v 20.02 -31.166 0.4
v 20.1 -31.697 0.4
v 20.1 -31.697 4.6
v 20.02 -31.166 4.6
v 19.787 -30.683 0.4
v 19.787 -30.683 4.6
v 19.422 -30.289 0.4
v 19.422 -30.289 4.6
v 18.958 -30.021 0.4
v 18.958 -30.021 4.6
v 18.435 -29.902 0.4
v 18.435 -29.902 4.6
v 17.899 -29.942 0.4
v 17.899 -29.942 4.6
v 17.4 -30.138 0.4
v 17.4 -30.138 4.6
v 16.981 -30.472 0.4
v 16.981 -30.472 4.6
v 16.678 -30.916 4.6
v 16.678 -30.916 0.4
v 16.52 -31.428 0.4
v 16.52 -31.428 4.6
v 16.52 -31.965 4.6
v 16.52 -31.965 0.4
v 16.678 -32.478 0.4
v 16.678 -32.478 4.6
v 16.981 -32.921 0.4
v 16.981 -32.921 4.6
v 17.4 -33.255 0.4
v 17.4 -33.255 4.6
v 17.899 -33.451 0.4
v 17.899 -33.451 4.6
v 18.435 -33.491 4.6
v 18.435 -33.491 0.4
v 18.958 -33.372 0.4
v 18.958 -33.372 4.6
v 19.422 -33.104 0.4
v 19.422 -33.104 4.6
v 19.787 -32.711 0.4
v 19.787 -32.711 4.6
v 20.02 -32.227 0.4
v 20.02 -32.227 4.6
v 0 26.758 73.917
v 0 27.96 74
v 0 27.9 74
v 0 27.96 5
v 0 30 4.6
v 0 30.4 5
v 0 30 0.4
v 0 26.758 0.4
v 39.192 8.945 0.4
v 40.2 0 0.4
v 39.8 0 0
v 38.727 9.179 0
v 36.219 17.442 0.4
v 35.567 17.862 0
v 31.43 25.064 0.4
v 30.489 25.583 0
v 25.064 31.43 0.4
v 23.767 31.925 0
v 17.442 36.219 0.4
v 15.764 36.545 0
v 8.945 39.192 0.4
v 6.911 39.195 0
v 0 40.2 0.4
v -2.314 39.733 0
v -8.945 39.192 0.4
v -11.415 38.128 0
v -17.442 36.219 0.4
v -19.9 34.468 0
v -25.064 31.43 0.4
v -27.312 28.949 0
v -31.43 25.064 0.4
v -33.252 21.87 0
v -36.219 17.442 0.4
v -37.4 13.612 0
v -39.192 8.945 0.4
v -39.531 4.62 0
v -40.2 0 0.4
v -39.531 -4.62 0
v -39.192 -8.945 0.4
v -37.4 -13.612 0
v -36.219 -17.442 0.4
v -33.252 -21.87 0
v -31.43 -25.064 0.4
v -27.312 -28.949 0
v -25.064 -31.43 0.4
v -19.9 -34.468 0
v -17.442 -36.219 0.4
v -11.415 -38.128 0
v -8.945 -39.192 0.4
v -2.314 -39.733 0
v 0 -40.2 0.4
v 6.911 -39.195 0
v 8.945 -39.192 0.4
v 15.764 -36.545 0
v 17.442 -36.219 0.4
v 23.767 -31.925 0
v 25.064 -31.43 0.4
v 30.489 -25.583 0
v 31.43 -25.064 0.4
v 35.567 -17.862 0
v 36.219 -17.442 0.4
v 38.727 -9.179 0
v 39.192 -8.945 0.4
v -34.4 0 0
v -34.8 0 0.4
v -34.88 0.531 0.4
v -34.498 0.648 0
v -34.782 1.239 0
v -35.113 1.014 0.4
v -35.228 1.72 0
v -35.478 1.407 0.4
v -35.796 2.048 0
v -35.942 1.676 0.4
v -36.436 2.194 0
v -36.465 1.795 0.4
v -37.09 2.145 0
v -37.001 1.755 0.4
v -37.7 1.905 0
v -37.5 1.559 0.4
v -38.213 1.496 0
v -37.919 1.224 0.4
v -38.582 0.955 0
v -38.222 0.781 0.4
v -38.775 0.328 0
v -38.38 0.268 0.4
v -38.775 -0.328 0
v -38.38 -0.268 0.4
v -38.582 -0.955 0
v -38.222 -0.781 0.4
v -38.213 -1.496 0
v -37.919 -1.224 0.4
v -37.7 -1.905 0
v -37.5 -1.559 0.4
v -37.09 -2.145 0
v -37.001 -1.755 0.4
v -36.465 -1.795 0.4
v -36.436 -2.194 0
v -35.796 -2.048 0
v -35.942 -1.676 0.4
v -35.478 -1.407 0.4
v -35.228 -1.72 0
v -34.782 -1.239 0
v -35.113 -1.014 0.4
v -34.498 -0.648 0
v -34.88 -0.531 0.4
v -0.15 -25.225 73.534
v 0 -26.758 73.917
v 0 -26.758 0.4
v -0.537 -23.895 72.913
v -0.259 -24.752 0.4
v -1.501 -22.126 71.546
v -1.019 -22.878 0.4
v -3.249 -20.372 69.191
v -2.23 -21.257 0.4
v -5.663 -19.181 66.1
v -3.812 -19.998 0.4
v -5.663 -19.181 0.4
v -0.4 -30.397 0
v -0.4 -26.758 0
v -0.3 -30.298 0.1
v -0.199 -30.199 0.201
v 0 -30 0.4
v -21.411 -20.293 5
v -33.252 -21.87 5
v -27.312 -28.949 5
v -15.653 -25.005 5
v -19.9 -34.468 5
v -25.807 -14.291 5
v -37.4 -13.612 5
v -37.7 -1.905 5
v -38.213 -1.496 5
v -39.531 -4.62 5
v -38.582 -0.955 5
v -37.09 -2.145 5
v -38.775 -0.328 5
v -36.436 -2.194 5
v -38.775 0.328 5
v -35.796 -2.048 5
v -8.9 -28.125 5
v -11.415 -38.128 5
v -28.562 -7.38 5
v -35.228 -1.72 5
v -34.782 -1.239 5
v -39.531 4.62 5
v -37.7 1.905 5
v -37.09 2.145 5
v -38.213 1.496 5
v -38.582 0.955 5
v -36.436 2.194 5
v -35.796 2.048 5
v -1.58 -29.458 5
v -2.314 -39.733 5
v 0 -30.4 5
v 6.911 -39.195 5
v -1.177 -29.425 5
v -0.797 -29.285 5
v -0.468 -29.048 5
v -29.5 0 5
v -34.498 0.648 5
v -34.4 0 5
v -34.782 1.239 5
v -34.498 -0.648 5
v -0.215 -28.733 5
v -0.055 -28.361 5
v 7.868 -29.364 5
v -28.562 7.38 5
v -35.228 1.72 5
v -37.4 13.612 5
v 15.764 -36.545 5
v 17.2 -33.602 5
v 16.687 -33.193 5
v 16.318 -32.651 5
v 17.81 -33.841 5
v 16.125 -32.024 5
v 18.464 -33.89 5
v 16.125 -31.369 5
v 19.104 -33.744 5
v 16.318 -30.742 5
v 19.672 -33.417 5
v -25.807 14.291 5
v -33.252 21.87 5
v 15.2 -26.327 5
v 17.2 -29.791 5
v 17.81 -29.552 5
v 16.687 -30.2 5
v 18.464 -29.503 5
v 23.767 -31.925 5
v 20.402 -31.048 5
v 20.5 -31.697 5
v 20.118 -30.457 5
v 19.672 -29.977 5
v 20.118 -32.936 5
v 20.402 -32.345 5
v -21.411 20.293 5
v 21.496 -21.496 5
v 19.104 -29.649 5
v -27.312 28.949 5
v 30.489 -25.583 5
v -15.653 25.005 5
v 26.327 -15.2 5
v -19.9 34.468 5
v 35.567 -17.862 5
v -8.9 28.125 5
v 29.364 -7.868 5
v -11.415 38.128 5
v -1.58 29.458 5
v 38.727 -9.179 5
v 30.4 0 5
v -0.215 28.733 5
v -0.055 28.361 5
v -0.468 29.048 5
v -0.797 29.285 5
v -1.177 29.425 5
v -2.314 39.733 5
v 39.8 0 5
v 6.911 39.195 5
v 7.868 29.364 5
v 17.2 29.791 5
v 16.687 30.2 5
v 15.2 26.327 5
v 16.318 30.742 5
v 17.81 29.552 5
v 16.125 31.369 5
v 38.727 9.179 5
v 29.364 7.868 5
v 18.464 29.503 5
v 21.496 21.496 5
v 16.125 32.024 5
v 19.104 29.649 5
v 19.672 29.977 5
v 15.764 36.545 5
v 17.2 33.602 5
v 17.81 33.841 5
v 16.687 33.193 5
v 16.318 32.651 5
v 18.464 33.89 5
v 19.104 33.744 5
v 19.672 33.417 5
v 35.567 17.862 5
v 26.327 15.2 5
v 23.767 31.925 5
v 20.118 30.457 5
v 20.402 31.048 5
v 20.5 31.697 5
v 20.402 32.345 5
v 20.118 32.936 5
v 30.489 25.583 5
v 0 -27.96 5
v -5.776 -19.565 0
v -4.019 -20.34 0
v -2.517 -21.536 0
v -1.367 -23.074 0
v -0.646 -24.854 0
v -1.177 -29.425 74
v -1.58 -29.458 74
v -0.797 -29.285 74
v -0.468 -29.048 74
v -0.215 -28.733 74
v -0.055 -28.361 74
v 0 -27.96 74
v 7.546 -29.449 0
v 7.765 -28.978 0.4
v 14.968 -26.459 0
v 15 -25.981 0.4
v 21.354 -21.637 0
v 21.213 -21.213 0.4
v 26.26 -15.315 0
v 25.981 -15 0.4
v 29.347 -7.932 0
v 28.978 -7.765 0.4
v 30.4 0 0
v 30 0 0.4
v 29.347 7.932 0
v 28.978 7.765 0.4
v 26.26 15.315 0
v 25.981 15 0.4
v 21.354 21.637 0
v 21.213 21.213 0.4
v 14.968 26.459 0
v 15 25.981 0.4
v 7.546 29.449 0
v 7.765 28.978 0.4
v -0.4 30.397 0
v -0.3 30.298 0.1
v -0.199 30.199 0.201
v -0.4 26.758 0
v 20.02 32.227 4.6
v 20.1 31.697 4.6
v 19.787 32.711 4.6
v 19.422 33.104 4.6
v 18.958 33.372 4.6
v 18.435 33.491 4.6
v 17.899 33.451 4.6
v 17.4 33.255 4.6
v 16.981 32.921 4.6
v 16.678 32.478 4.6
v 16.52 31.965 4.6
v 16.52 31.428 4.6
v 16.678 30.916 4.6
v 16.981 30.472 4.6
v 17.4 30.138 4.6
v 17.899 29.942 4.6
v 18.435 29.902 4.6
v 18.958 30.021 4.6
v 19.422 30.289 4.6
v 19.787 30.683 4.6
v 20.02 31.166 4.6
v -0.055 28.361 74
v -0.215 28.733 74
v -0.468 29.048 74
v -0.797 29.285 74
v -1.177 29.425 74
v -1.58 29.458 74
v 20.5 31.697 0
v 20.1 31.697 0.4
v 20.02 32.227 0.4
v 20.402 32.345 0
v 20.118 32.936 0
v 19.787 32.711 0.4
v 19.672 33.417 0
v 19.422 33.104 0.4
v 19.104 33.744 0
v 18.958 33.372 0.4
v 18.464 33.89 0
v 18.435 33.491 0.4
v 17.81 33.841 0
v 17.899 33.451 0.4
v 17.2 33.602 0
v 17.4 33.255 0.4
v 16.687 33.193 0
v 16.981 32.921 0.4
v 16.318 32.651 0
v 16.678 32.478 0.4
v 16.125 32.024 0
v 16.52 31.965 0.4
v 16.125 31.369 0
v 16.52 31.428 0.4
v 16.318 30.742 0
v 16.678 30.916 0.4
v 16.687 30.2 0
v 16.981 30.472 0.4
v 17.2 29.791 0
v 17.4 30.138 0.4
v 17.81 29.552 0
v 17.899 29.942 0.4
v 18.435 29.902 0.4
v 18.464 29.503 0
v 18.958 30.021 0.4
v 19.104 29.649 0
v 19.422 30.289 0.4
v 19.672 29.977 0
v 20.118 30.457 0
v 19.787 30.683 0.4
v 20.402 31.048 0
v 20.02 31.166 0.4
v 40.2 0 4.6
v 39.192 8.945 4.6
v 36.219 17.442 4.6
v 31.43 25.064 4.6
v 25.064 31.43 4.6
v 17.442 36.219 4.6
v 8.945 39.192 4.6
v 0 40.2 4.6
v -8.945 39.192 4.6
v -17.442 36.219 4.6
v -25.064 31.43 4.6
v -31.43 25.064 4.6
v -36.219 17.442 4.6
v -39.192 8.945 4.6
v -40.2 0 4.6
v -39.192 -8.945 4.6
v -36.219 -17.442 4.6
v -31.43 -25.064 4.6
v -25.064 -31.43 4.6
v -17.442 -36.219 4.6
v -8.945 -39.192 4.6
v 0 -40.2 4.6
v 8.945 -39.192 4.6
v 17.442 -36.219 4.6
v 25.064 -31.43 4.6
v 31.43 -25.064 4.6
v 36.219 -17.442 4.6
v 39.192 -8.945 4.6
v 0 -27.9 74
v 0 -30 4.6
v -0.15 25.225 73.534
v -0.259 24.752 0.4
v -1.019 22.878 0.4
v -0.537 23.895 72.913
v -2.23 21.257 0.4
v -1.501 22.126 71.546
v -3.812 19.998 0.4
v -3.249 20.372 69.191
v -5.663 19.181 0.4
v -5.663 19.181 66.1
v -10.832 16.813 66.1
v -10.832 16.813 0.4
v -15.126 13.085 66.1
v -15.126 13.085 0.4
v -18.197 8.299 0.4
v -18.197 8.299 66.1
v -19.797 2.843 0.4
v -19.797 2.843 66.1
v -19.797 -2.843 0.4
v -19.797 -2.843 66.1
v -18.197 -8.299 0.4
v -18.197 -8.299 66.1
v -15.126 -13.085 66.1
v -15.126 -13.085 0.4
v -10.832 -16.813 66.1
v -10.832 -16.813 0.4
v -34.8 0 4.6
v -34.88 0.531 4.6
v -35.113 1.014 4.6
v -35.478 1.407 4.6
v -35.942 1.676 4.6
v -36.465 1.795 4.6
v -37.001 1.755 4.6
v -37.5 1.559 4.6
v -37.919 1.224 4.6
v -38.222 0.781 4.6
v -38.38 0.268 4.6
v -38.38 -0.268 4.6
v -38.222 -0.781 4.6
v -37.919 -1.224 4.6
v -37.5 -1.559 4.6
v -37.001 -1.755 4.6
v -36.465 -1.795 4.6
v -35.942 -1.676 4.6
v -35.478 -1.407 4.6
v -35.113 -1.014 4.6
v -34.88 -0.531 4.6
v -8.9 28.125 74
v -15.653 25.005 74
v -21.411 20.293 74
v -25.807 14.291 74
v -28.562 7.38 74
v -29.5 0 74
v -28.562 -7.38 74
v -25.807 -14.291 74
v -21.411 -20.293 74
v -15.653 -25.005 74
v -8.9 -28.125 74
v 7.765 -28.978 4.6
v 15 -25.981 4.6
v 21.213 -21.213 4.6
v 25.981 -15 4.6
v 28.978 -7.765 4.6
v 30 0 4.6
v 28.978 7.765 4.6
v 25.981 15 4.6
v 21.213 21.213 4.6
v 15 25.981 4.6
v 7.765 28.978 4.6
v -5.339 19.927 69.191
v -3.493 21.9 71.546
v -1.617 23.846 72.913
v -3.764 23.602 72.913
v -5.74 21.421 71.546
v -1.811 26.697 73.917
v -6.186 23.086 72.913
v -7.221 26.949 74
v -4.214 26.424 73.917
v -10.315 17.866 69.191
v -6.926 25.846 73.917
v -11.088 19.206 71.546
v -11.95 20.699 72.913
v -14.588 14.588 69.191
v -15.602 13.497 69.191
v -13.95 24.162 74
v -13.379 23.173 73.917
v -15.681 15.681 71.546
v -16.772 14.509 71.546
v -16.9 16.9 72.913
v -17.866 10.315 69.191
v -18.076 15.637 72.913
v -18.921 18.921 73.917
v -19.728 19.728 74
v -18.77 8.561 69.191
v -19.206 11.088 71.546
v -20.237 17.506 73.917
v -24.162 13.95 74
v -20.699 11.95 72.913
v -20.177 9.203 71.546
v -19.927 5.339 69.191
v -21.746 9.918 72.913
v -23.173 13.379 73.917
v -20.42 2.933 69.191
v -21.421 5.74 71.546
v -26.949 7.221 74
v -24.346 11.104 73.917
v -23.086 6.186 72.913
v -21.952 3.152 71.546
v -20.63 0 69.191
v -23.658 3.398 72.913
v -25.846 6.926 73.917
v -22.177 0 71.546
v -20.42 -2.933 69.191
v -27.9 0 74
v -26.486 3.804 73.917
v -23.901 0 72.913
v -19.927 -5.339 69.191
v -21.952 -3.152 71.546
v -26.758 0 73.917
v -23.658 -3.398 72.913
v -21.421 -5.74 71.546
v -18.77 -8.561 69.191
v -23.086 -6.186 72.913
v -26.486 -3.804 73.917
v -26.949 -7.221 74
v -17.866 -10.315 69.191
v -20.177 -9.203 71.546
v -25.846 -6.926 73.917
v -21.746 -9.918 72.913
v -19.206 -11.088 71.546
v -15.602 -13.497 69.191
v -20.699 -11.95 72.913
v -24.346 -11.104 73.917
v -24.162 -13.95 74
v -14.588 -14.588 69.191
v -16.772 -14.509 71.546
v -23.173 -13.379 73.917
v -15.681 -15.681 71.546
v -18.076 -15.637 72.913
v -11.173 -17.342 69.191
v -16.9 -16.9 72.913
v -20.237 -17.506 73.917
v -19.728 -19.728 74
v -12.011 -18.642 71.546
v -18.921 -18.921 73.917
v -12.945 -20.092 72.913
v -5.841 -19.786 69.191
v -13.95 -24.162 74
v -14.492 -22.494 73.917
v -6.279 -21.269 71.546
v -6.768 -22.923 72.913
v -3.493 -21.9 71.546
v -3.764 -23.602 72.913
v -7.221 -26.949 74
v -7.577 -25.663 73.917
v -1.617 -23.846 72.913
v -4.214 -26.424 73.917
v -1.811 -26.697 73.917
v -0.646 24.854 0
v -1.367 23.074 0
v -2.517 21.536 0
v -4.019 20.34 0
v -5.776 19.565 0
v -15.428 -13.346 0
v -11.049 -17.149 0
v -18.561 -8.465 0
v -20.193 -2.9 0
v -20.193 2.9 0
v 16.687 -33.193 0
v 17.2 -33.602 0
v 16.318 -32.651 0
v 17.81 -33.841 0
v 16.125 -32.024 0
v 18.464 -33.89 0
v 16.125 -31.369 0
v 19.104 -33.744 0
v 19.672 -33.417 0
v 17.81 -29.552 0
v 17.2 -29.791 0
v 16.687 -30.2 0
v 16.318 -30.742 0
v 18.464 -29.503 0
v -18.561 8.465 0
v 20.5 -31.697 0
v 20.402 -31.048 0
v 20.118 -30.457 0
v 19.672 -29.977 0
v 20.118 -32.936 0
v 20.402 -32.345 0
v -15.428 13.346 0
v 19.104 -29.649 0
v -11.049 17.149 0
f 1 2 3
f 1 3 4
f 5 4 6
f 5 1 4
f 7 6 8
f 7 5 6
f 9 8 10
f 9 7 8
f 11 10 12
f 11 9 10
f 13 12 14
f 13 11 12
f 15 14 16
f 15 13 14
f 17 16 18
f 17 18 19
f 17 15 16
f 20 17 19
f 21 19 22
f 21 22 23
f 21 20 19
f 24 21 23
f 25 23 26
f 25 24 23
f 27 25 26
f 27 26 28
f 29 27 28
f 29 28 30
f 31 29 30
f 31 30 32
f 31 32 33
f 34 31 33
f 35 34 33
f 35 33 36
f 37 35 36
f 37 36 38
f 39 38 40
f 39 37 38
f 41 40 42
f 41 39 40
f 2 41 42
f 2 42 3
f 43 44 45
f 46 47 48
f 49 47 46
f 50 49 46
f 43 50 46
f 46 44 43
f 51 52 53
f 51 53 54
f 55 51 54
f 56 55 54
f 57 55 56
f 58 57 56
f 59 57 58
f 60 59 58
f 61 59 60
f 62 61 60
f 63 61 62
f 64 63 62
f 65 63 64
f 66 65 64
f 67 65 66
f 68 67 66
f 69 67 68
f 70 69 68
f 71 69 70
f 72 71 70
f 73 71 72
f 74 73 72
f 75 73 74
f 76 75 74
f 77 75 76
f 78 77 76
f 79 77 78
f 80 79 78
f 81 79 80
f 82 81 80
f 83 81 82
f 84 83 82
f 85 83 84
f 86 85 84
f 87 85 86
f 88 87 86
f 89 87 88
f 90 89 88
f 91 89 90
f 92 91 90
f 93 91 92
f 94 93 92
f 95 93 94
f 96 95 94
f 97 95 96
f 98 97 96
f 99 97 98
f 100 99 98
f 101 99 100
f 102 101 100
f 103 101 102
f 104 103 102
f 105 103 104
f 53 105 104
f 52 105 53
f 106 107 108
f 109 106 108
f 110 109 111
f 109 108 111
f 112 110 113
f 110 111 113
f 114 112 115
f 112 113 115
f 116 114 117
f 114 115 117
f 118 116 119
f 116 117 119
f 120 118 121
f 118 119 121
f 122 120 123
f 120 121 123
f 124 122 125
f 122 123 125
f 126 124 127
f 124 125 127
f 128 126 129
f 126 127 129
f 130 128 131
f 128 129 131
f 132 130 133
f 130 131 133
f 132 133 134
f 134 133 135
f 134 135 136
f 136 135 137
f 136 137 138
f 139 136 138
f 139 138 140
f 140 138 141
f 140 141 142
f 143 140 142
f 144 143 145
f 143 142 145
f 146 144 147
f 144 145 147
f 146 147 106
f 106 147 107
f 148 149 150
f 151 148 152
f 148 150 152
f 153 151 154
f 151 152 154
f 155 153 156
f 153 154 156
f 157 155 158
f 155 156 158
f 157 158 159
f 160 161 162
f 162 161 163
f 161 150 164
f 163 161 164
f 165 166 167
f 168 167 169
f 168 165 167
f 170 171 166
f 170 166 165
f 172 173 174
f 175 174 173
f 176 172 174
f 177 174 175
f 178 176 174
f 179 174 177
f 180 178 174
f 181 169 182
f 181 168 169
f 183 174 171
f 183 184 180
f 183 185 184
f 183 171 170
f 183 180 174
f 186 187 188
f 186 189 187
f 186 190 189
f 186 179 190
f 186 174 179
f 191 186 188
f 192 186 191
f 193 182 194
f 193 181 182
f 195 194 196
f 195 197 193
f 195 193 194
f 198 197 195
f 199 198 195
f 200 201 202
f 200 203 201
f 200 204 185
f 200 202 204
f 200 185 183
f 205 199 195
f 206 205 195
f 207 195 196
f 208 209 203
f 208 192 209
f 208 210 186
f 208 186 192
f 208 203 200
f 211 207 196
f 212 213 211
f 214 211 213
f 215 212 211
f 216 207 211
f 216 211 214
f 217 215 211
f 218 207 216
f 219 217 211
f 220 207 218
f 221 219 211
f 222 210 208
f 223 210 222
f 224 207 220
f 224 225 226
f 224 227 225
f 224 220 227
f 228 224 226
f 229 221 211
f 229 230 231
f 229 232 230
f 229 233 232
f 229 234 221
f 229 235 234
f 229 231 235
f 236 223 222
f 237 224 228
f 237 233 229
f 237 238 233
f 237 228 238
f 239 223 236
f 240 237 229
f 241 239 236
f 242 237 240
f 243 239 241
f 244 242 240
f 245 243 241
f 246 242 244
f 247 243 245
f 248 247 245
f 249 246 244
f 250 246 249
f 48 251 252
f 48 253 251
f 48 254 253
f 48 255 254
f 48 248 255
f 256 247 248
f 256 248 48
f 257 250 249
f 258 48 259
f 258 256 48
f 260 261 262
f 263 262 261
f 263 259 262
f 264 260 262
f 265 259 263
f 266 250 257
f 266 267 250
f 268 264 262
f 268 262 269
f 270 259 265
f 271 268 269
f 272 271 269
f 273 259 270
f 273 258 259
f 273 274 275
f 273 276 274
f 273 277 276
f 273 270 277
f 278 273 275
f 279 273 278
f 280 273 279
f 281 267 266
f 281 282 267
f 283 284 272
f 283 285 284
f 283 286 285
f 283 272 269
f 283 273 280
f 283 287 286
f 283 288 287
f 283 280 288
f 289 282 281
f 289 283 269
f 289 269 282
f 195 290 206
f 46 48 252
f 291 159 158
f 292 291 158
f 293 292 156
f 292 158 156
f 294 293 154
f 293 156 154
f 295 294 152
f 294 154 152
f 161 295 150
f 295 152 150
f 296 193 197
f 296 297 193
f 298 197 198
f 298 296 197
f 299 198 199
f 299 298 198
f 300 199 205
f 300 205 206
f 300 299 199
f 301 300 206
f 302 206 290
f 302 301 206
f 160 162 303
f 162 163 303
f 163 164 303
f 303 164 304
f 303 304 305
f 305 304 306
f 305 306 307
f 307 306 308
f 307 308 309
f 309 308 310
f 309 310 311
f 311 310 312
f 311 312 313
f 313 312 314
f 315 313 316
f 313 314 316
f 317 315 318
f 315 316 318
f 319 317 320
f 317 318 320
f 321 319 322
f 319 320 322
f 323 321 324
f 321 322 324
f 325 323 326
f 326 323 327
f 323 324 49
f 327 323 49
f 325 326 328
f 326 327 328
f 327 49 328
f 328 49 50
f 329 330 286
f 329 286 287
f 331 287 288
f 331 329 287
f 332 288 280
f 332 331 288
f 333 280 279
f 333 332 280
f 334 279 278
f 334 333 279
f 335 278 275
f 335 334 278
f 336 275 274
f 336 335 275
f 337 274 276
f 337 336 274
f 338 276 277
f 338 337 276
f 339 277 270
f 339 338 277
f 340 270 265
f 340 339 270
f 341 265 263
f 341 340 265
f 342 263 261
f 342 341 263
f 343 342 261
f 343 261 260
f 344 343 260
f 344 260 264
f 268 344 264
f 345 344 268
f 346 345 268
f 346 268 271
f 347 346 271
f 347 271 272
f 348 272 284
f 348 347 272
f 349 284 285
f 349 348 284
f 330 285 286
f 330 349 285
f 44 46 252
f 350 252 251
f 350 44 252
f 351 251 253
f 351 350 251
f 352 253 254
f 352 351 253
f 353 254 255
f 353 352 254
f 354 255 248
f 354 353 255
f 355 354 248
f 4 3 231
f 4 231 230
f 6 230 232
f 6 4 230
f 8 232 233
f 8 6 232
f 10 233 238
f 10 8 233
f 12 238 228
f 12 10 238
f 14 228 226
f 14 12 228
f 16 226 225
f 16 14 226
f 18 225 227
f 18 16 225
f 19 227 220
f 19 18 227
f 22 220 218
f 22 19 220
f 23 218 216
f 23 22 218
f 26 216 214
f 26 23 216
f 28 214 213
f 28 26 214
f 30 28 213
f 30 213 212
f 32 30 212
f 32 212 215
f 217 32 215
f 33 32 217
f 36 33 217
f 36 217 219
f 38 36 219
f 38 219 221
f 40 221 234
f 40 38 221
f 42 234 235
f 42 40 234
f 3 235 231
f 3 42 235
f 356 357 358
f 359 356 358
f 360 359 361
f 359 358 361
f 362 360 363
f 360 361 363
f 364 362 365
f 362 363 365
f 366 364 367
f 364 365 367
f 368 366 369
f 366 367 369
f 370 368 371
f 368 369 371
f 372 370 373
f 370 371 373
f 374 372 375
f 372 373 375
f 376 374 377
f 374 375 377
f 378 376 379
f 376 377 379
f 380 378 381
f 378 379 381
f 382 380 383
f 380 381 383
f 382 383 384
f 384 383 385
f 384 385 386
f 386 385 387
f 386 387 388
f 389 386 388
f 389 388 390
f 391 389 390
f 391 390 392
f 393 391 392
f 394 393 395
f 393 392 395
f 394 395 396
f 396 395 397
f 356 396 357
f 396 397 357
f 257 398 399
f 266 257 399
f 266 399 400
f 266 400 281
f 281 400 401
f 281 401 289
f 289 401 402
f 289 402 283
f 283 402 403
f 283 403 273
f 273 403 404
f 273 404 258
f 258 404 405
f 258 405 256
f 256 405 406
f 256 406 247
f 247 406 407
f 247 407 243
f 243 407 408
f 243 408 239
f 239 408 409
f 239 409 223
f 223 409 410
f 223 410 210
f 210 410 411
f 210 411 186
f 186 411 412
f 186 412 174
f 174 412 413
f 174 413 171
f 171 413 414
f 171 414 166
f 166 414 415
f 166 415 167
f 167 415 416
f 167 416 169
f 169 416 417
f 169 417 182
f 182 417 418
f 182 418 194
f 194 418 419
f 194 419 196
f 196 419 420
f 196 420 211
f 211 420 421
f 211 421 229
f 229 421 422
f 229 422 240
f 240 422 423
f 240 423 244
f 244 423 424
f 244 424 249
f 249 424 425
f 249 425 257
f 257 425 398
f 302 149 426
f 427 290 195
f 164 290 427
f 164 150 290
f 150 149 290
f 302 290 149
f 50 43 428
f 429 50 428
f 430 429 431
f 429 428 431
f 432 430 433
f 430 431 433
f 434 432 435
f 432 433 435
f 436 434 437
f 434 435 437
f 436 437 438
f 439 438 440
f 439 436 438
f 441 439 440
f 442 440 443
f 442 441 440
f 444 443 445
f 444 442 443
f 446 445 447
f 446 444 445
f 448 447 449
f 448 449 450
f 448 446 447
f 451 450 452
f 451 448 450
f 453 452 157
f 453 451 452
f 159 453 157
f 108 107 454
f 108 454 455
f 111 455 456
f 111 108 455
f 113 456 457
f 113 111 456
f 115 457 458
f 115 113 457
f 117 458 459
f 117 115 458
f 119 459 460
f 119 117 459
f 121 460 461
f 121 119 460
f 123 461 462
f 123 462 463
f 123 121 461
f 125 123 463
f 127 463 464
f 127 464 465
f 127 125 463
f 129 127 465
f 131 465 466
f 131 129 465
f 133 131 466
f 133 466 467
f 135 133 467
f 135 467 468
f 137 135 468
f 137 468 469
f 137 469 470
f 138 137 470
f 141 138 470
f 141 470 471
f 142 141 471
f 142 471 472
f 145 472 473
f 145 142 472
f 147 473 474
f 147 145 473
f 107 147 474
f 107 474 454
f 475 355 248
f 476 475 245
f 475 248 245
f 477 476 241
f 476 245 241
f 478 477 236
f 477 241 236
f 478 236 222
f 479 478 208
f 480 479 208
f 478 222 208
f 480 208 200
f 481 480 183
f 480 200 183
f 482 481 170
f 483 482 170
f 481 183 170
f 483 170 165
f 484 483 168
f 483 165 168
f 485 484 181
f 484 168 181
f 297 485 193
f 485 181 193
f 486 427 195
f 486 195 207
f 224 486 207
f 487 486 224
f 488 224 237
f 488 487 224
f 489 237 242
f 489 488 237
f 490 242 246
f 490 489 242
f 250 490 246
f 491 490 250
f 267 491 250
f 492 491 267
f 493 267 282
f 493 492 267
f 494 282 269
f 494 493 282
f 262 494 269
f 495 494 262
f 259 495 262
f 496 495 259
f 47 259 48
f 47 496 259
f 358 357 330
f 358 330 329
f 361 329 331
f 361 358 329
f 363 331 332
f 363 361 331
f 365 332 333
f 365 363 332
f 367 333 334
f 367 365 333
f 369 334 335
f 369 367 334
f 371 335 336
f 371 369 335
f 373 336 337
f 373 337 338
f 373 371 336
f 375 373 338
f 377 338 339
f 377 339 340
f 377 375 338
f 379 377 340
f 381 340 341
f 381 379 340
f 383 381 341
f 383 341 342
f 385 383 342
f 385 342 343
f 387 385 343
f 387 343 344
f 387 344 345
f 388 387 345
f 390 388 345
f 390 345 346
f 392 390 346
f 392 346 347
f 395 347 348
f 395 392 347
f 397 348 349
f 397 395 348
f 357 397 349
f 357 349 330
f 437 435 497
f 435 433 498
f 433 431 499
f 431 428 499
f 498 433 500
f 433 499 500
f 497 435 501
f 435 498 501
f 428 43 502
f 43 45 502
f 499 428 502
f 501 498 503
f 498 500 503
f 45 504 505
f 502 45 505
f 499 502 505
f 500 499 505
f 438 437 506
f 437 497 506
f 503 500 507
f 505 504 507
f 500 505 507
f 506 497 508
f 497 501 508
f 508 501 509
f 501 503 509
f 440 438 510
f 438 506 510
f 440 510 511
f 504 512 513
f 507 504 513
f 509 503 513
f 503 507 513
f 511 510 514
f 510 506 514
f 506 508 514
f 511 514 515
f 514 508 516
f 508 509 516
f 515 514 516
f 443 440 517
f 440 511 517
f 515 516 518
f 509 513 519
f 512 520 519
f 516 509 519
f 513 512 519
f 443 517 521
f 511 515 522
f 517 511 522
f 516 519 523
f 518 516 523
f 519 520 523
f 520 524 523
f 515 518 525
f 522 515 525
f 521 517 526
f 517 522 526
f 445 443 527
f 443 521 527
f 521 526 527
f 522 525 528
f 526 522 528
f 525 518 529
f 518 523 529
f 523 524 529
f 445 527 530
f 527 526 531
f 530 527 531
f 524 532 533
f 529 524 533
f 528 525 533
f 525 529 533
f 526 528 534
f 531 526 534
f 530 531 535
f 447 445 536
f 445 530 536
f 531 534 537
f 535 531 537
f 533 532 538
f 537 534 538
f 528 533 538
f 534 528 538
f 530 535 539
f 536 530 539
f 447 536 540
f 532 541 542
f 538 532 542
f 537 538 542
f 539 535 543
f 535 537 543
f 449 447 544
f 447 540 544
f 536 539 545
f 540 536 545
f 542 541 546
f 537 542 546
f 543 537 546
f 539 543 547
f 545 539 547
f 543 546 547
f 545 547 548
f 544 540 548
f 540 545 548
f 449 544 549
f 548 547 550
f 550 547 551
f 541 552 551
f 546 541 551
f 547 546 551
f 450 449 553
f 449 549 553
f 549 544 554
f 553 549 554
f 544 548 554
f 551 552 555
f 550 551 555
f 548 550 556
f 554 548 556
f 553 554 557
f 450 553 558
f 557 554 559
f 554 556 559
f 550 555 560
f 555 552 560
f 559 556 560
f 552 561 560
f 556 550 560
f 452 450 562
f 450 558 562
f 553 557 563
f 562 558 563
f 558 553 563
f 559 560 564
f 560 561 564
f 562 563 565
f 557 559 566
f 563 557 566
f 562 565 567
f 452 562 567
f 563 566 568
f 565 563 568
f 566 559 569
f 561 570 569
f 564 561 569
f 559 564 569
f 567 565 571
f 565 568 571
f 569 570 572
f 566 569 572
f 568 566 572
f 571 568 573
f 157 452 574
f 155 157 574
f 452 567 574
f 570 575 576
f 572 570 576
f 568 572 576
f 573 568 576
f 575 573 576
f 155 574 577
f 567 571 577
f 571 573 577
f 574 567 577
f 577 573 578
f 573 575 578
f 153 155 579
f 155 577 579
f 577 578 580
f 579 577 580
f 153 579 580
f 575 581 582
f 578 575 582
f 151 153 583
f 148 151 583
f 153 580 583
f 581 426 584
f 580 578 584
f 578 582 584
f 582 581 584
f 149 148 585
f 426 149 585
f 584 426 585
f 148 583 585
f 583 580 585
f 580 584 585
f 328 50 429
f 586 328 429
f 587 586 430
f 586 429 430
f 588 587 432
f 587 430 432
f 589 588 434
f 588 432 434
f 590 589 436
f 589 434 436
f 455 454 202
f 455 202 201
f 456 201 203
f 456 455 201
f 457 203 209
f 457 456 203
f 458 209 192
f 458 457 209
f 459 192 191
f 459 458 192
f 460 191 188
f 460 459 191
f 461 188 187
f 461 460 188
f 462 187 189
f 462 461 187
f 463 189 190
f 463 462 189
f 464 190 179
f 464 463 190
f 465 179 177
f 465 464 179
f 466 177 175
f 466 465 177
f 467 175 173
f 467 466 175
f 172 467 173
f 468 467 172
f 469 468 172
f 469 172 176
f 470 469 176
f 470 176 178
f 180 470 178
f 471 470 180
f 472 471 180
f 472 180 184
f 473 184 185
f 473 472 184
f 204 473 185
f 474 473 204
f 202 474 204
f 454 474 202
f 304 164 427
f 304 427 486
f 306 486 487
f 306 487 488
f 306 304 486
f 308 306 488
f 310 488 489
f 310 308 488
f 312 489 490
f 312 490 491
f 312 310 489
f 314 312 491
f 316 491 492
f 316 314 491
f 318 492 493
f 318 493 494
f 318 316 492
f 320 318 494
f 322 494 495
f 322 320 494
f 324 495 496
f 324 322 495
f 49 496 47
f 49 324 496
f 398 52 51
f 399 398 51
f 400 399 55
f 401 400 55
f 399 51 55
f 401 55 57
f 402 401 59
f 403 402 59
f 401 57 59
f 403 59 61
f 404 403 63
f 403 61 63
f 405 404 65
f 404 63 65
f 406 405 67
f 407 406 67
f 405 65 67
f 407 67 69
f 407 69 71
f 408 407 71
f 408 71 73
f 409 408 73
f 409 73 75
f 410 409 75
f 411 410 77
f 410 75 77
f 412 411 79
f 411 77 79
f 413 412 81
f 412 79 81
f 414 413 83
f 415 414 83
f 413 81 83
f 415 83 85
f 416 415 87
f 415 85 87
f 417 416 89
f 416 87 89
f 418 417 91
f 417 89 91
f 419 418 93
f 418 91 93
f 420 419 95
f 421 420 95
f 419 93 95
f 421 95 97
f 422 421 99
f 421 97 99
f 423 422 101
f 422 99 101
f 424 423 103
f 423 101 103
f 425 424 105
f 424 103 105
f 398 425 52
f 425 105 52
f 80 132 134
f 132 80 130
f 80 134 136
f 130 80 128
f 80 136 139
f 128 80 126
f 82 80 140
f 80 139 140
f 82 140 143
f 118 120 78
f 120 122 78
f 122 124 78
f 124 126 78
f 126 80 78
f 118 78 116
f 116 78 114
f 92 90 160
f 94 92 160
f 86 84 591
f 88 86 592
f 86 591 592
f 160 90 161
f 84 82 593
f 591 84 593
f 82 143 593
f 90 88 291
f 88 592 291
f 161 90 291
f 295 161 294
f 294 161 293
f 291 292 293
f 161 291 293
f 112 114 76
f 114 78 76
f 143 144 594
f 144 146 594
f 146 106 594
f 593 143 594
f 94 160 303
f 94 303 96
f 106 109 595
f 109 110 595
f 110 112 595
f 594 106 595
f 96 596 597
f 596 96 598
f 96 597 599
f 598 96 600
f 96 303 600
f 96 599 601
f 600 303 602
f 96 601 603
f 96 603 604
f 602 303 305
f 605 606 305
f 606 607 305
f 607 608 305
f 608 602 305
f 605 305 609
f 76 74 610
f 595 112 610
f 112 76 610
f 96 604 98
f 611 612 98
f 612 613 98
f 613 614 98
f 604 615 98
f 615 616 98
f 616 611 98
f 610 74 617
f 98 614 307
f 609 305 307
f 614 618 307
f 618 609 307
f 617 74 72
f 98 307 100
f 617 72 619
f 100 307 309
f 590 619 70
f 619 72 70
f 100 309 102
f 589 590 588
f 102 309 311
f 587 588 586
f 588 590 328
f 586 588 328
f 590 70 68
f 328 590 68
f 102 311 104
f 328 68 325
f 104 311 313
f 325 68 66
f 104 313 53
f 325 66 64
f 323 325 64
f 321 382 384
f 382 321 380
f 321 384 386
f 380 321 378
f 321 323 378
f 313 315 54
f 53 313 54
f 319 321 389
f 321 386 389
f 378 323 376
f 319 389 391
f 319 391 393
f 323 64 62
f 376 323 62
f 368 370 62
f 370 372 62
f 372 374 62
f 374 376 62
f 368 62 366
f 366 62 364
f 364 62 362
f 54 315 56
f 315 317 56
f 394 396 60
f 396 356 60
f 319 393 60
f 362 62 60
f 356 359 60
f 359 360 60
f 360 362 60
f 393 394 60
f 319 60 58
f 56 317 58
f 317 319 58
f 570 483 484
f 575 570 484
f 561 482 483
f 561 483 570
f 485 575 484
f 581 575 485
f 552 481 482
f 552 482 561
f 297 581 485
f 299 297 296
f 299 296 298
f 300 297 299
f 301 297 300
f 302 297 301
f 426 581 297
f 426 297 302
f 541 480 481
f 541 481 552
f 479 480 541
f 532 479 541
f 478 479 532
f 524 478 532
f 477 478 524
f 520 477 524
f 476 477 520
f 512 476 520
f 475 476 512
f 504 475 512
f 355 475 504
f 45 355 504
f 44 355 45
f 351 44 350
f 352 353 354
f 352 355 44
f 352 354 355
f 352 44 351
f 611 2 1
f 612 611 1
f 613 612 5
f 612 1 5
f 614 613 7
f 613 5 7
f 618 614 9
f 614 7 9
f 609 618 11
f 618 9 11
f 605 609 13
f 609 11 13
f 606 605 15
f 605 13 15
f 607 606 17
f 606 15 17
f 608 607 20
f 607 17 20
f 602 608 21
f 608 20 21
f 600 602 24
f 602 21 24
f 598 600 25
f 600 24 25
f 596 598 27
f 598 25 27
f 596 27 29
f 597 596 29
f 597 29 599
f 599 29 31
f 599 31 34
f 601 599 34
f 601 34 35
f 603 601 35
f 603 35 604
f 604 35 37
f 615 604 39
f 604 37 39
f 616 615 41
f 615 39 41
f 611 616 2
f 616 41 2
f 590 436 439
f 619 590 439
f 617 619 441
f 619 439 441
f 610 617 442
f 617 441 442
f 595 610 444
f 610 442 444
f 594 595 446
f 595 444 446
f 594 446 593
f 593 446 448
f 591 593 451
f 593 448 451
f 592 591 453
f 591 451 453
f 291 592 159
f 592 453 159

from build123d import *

# Parameters (mm, degrees)
SKETCH_R     = 40.2
SKETCH_R_2   = 20
PAD_DEPTH    = 5
PAD001_DEPTH = 74
POCKET_DEPTH = 5
FILLET_R     = 1.5
FILLET001_R  = 7.9
SKETCH003_R  = 1.8
HOLE_DEPTH   = 5
CHAMFER_SIZE = 0.4


with BuildPart() as part:
    # Sketch → Pad (new body)
    with BuildSketch(Plane.XY):
        Circle(SKETCH_R)
        Circle(SKETCH_R_2, mode=Mode.SUBTRACT)
    extrude(amount=PAD_DEPTH)

    # Sketch001 → Pad001 (join)
    with BuildSketch(Plane.XY):
        with BuildLine():
            ThreePointArc((0, 29.5), (-29.5, 0), (0, -29.5))
            Line((0, -20), (0, -29.5))
            ThreePointArc((0, 20), (-20, 0), (0, -20))
            Line((0, 29.5), (0, 20))
        make_face()
    extrude(amount=PAD001_DEPTH)

    # Sketch002 → Pocket (cut)
    with BuildSketch(Plane.XY):
        with BuildLine():
            ThreePointArc((0, -30), (30, 0), (0, 30))
            Line((0, 30), (0, 20))
            ThreePointArc((0, -20), (20, 0), (0, 20))
            Line((0, -20), (0, -30))
        make_face()
    extrude(amount=POCKET_DEPTH, mode=Mode.SUBTRACT)

    # Fillet
    fillet_edges = [part.edges().sort_by_distance(p)[0] for p in [
        (0, -29.5, 39.5),
        (0, 29.5, 39.5),
    ]]
    fillet(fillet_edges, radius=FILLET_R)

    # Fillet001
    fillet001_edges = [part.edges().sort_by_distance(p)[0] for p in [
        (-20, 0, 74),
        (0, -20, 39.5),
        (0, 20, 39.5),
    ]]
    fillet(fillet001_edges, radius=FILLET001_R)

    # Sketch003 → Hole (cut)
    with BuildSketch(Plane.XY):
        with Locations((-36.6, 0)):
            Circle(SKETCH003_R)
        with Locations((18.3, 31.69653)):
            Circle(SKETCH003_R)
        with Locations((18.3, -31.69653)):
            Circle(SKETCH003_R)
    extrude(amount=HOLE_DEPTH, mode=Mode.SUBTRACT)

    # Chamfer
    chamfer_edges = [part.edges().sort_by_distance(p)[0] for p in [
        (-40.2, 0, 5),
        (20.1, -31.69653, 5),
        (20.1, 31.69653, 5),
        (30, 0, 5),
        (-40.2, 0, 0),
        (30, 0, 0),
        (20.1, -31.69653, 0),
        (20.1, 31.69653, 0),
        (-34.8, 0, 0),
        (0, -29.75, 0),
        (0, -28.129088, 0),
        (-1.572218, -22.02857, 0),
        (-20, 0, 0),
        (-1.572218, 22.02857, 0),
        (0, 29.75, 0),
        (0, 28.129088, 0),
        (-34.8, 0, 5),
    ]]
    chamfer(chamfer_edges, length=CHAMFER_SIZE)


solid = part.part
